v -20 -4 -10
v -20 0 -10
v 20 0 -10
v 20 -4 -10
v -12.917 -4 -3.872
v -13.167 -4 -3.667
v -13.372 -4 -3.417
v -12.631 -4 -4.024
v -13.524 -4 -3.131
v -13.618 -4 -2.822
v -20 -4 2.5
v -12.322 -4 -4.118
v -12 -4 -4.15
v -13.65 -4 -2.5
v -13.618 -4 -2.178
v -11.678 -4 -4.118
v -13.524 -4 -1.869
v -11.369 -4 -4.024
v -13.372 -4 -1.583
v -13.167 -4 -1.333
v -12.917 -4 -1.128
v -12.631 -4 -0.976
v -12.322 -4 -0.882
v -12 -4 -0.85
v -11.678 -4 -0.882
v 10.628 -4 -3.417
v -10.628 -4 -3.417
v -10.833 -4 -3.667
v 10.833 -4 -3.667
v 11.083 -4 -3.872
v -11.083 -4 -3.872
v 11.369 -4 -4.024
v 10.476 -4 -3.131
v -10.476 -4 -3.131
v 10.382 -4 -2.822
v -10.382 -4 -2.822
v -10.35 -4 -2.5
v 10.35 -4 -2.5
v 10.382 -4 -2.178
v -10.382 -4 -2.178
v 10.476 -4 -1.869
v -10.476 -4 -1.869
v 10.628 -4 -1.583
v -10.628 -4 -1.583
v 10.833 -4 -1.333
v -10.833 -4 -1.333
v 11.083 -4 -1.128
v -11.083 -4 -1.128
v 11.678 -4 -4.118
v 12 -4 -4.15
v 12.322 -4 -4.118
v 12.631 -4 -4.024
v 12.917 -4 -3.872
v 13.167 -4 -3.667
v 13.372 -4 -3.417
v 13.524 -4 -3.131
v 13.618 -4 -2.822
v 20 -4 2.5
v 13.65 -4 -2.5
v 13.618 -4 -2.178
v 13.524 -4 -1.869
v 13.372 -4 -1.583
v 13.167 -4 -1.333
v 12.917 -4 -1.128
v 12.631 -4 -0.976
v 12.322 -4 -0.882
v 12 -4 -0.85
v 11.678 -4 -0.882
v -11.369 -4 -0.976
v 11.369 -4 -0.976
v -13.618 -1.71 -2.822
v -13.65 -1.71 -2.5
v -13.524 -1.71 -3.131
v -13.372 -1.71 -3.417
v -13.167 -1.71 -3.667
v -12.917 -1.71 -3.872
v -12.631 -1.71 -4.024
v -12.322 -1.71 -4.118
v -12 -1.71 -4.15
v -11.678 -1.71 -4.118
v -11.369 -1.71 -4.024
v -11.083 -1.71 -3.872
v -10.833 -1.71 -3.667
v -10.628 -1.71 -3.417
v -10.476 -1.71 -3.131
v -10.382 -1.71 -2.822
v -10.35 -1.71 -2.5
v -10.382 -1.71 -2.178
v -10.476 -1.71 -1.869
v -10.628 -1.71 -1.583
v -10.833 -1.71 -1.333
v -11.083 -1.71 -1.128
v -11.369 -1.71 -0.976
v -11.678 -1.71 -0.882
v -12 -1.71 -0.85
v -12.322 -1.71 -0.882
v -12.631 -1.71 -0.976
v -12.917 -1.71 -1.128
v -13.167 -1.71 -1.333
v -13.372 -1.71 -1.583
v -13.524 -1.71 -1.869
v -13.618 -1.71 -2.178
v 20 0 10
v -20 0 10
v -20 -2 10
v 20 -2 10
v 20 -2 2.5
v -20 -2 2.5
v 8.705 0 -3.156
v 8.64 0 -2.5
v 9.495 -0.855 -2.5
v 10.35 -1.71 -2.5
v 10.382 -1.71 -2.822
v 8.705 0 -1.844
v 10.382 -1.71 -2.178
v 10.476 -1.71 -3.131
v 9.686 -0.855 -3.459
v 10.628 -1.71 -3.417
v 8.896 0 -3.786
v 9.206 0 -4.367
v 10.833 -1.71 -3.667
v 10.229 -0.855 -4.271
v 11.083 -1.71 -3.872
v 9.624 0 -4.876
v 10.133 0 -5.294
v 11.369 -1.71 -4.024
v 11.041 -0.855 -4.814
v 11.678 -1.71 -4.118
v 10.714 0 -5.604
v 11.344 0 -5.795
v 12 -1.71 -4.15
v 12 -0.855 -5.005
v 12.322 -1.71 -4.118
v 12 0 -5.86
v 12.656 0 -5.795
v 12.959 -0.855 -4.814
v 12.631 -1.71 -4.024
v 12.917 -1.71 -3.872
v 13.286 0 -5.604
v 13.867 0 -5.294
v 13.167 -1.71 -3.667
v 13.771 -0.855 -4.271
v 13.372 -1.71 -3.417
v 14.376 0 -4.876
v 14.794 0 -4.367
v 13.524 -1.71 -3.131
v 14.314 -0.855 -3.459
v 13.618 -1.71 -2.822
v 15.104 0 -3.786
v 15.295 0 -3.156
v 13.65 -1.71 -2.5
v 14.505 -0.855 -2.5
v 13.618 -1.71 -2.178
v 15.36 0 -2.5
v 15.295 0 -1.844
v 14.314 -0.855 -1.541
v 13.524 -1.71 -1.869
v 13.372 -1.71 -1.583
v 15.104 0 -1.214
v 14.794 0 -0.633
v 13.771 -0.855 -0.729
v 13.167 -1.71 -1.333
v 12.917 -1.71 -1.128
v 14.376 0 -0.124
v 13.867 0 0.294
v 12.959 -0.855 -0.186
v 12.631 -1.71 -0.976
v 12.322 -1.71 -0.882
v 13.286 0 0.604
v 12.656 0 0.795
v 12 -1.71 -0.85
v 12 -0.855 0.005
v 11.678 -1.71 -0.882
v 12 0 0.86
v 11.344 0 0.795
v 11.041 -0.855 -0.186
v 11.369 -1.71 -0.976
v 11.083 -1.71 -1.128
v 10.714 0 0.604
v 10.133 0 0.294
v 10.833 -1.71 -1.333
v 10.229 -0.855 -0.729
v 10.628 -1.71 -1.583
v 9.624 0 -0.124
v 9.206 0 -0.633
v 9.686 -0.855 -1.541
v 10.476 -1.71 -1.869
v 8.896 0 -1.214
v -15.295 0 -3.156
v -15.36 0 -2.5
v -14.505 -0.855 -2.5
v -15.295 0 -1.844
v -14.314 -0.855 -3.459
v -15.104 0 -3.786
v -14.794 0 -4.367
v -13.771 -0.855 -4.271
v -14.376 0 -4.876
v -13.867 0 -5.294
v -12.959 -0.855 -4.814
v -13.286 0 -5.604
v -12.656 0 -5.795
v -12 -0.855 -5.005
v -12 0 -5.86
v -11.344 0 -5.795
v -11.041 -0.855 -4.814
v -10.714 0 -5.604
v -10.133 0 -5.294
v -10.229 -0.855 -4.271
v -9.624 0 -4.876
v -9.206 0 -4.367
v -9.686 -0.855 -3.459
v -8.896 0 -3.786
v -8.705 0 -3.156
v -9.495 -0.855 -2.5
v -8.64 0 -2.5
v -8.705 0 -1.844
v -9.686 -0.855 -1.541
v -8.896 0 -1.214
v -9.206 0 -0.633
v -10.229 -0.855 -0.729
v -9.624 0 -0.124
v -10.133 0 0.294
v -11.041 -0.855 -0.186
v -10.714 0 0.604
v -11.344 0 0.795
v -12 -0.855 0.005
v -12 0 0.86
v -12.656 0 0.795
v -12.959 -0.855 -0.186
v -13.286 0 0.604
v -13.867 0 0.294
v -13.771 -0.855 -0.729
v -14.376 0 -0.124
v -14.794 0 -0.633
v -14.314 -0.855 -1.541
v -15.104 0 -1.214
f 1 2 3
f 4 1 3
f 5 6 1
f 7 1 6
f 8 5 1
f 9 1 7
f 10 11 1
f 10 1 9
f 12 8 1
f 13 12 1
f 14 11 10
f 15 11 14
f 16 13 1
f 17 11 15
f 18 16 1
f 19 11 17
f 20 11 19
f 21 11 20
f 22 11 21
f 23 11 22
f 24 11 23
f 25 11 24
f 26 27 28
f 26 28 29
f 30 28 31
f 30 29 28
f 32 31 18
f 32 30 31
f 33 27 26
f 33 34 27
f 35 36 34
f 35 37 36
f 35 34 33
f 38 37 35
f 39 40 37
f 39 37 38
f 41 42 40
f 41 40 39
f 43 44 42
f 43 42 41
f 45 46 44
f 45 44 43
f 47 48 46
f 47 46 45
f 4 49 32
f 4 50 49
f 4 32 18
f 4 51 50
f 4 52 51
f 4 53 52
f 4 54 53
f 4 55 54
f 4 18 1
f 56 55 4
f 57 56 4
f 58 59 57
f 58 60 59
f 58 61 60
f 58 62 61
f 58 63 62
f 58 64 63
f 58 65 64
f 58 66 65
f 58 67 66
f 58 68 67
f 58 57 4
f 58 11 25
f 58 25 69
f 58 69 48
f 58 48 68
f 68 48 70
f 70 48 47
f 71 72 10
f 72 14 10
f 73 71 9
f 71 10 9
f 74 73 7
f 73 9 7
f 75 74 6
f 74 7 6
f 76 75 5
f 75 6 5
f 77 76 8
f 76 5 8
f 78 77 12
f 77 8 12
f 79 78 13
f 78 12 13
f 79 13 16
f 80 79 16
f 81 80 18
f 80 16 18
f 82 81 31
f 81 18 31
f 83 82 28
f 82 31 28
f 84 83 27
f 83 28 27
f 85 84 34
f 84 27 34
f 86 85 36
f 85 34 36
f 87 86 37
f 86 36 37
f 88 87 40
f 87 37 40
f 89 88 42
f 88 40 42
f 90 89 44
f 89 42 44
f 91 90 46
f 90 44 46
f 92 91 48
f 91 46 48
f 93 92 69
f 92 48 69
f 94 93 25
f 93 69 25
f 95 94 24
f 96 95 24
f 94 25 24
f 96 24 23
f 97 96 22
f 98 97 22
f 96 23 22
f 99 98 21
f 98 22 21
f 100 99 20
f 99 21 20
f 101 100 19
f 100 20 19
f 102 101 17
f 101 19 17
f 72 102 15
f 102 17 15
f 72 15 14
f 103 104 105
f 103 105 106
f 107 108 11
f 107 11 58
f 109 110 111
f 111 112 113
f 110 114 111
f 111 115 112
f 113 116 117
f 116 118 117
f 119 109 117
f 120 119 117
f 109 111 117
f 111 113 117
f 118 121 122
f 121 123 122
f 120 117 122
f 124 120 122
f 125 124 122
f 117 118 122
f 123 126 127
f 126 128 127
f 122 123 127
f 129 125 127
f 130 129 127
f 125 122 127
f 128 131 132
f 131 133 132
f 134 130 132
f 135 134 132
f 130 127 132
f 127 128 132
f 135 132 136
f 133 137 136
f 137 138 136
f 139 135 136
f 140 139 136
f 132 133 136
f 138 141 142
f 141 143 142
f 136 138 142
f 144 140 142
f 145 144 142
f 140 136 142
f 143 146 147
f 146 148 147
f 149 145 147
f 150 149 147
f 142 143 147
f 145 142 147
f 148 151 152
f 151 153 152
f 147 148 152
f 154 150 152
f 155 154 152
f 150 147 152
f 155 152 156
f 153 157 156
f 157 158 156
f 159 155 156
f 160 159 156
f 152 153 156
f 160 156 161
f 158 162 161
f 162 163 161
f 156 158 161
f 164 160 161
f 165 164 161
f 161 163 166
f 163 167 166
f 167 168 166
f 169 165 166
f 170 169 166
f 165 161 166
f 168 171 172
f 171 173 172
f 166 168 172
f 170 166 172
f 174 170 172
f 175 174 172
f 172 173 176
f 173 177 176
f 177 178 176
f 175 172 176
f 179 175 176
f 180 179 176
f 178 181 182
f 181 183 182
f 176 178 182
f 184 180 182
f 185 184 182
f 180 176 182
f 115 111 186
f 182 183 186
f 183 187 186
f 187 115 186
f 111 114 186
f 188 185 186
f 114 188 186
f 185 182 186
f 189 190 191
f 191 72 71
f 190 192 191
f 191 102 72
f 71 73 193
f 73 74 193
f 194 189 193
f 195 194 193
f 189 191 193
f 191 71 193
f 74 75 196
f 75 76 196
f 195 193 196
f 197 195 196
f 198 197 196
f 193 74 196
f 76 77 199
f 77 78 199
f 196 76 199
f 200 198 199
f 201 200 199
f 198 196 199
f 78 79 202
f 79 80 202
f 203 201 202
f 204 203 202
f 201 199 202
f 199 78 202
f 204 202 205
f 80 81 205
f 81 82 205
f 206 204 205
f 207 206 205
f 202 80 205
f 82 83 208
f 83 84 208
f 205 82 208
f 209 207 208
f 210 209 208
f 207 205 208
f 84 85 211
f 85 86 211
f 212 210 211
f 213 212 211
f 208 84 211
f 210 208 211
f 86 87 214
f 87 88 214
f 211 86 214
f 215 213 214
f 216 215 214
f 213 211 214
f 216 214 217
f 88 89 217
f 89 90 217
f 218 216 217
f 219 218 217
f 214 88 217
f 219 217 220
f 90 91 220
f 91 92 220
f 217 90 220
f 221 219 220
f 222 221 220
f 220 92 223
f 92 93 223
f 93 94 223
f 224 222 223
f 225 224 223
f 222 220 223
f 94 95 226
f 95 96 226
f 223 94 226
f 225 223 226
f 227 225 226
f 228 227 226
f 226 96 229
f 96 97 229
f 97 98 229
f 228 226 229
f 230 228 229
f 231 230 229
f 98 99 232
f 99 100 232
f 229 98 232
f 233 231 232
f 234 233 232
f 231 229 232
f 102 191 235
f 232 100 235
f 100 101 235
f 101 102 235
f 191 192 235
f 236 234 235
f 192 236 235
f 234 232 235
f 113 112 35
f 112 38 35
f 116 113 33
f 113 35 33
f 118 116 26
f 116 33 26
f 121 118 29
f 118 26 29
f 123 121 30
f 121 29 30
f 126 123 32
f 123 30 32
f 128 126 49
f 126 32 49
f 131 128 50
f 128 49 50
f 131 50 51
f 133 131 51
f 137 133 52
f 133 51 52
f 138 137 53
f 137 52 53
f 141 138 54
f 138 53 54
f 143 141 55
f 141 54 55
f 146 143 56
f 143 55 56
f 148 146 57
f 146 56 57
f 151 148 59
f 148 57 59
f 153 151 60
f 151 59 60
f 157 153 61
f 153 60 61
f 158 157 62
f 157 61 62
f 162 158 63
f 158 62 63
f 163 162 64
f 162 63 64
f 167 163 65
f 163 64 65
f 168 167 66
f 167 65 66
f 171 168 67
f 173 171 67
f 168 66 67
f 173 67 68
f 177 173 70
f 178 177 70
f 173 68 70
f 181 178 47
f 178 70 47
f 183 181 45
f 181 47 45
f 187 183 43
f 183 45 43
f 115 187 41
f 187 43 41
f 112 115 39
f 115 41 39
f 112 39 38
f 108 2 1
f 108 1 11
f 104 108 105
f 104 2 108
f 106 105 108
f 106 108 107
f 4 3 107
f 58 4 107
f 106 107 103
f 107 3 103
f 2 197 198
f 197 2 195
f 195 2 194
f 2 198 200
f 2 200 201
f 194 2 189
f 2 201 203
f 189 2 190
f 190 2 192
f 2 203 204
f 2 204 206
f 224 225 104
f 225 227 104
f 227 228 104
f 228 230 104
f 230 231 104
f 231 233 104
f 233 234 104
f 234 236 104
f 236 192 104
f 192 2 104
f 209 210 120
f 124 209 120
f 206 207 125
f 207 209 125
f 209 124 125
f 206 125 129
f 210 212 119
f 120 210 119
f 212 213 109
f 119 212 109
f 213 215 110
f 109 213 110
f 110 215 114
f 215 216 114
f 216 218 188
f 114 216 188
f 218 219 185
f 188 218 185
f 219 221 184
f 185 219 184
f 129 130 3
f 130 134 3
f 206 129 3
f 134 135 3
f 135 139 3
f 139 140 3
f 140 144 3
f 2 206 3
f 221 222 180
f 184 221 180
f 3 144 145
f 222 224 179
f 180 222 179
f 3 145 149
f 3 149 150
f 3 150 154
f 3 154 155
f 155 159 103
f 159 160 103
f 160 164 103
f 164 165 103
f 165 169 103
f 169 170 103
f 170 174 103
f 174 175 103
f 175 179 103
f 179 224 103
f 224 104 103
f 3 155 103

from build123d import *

# Parameters (mm, degrees)
F0_W           = 40
F0_H           = 7.5
F1_DEPTH       = 2
F0_H_2         = 12.5
F2_DEPTH       = 4
F3_D           = 3.3
F3_CSINK_D     = 6.72
F3_CSINK_ANGLE = 90


with BuildPart() as f1:
    # F0 (on Front) → F1 (new body)
    with BuildSketch(Plane.XZ):
        with Locations((0, 6.25)):
            Rectangle(F0_W, F0_H)
    extrude(amount=F1_DEPTH)

    # F0 (on Front) → F2 (join)
    with BuildSketch(Plane.XZ):
        with Locations((0, -3.75)):
            Rectangle(F0_W, F0_H_2)
    extrude(amount=F2_DEPTH)

    # F3 (through all)
    with Locations(Plane(origin=(0, 0, 0), x_dir=(1, 0, 0), z_dir=(0, 1, 0))):
        with Locations((-12, 2.5), (12, 2.5)):
            CounterSinkHole(F3_D / 2, F3_CSINK_D / 2, counter_sink_angle=F3_CSINK_ANGLE)


solid = f1.part
